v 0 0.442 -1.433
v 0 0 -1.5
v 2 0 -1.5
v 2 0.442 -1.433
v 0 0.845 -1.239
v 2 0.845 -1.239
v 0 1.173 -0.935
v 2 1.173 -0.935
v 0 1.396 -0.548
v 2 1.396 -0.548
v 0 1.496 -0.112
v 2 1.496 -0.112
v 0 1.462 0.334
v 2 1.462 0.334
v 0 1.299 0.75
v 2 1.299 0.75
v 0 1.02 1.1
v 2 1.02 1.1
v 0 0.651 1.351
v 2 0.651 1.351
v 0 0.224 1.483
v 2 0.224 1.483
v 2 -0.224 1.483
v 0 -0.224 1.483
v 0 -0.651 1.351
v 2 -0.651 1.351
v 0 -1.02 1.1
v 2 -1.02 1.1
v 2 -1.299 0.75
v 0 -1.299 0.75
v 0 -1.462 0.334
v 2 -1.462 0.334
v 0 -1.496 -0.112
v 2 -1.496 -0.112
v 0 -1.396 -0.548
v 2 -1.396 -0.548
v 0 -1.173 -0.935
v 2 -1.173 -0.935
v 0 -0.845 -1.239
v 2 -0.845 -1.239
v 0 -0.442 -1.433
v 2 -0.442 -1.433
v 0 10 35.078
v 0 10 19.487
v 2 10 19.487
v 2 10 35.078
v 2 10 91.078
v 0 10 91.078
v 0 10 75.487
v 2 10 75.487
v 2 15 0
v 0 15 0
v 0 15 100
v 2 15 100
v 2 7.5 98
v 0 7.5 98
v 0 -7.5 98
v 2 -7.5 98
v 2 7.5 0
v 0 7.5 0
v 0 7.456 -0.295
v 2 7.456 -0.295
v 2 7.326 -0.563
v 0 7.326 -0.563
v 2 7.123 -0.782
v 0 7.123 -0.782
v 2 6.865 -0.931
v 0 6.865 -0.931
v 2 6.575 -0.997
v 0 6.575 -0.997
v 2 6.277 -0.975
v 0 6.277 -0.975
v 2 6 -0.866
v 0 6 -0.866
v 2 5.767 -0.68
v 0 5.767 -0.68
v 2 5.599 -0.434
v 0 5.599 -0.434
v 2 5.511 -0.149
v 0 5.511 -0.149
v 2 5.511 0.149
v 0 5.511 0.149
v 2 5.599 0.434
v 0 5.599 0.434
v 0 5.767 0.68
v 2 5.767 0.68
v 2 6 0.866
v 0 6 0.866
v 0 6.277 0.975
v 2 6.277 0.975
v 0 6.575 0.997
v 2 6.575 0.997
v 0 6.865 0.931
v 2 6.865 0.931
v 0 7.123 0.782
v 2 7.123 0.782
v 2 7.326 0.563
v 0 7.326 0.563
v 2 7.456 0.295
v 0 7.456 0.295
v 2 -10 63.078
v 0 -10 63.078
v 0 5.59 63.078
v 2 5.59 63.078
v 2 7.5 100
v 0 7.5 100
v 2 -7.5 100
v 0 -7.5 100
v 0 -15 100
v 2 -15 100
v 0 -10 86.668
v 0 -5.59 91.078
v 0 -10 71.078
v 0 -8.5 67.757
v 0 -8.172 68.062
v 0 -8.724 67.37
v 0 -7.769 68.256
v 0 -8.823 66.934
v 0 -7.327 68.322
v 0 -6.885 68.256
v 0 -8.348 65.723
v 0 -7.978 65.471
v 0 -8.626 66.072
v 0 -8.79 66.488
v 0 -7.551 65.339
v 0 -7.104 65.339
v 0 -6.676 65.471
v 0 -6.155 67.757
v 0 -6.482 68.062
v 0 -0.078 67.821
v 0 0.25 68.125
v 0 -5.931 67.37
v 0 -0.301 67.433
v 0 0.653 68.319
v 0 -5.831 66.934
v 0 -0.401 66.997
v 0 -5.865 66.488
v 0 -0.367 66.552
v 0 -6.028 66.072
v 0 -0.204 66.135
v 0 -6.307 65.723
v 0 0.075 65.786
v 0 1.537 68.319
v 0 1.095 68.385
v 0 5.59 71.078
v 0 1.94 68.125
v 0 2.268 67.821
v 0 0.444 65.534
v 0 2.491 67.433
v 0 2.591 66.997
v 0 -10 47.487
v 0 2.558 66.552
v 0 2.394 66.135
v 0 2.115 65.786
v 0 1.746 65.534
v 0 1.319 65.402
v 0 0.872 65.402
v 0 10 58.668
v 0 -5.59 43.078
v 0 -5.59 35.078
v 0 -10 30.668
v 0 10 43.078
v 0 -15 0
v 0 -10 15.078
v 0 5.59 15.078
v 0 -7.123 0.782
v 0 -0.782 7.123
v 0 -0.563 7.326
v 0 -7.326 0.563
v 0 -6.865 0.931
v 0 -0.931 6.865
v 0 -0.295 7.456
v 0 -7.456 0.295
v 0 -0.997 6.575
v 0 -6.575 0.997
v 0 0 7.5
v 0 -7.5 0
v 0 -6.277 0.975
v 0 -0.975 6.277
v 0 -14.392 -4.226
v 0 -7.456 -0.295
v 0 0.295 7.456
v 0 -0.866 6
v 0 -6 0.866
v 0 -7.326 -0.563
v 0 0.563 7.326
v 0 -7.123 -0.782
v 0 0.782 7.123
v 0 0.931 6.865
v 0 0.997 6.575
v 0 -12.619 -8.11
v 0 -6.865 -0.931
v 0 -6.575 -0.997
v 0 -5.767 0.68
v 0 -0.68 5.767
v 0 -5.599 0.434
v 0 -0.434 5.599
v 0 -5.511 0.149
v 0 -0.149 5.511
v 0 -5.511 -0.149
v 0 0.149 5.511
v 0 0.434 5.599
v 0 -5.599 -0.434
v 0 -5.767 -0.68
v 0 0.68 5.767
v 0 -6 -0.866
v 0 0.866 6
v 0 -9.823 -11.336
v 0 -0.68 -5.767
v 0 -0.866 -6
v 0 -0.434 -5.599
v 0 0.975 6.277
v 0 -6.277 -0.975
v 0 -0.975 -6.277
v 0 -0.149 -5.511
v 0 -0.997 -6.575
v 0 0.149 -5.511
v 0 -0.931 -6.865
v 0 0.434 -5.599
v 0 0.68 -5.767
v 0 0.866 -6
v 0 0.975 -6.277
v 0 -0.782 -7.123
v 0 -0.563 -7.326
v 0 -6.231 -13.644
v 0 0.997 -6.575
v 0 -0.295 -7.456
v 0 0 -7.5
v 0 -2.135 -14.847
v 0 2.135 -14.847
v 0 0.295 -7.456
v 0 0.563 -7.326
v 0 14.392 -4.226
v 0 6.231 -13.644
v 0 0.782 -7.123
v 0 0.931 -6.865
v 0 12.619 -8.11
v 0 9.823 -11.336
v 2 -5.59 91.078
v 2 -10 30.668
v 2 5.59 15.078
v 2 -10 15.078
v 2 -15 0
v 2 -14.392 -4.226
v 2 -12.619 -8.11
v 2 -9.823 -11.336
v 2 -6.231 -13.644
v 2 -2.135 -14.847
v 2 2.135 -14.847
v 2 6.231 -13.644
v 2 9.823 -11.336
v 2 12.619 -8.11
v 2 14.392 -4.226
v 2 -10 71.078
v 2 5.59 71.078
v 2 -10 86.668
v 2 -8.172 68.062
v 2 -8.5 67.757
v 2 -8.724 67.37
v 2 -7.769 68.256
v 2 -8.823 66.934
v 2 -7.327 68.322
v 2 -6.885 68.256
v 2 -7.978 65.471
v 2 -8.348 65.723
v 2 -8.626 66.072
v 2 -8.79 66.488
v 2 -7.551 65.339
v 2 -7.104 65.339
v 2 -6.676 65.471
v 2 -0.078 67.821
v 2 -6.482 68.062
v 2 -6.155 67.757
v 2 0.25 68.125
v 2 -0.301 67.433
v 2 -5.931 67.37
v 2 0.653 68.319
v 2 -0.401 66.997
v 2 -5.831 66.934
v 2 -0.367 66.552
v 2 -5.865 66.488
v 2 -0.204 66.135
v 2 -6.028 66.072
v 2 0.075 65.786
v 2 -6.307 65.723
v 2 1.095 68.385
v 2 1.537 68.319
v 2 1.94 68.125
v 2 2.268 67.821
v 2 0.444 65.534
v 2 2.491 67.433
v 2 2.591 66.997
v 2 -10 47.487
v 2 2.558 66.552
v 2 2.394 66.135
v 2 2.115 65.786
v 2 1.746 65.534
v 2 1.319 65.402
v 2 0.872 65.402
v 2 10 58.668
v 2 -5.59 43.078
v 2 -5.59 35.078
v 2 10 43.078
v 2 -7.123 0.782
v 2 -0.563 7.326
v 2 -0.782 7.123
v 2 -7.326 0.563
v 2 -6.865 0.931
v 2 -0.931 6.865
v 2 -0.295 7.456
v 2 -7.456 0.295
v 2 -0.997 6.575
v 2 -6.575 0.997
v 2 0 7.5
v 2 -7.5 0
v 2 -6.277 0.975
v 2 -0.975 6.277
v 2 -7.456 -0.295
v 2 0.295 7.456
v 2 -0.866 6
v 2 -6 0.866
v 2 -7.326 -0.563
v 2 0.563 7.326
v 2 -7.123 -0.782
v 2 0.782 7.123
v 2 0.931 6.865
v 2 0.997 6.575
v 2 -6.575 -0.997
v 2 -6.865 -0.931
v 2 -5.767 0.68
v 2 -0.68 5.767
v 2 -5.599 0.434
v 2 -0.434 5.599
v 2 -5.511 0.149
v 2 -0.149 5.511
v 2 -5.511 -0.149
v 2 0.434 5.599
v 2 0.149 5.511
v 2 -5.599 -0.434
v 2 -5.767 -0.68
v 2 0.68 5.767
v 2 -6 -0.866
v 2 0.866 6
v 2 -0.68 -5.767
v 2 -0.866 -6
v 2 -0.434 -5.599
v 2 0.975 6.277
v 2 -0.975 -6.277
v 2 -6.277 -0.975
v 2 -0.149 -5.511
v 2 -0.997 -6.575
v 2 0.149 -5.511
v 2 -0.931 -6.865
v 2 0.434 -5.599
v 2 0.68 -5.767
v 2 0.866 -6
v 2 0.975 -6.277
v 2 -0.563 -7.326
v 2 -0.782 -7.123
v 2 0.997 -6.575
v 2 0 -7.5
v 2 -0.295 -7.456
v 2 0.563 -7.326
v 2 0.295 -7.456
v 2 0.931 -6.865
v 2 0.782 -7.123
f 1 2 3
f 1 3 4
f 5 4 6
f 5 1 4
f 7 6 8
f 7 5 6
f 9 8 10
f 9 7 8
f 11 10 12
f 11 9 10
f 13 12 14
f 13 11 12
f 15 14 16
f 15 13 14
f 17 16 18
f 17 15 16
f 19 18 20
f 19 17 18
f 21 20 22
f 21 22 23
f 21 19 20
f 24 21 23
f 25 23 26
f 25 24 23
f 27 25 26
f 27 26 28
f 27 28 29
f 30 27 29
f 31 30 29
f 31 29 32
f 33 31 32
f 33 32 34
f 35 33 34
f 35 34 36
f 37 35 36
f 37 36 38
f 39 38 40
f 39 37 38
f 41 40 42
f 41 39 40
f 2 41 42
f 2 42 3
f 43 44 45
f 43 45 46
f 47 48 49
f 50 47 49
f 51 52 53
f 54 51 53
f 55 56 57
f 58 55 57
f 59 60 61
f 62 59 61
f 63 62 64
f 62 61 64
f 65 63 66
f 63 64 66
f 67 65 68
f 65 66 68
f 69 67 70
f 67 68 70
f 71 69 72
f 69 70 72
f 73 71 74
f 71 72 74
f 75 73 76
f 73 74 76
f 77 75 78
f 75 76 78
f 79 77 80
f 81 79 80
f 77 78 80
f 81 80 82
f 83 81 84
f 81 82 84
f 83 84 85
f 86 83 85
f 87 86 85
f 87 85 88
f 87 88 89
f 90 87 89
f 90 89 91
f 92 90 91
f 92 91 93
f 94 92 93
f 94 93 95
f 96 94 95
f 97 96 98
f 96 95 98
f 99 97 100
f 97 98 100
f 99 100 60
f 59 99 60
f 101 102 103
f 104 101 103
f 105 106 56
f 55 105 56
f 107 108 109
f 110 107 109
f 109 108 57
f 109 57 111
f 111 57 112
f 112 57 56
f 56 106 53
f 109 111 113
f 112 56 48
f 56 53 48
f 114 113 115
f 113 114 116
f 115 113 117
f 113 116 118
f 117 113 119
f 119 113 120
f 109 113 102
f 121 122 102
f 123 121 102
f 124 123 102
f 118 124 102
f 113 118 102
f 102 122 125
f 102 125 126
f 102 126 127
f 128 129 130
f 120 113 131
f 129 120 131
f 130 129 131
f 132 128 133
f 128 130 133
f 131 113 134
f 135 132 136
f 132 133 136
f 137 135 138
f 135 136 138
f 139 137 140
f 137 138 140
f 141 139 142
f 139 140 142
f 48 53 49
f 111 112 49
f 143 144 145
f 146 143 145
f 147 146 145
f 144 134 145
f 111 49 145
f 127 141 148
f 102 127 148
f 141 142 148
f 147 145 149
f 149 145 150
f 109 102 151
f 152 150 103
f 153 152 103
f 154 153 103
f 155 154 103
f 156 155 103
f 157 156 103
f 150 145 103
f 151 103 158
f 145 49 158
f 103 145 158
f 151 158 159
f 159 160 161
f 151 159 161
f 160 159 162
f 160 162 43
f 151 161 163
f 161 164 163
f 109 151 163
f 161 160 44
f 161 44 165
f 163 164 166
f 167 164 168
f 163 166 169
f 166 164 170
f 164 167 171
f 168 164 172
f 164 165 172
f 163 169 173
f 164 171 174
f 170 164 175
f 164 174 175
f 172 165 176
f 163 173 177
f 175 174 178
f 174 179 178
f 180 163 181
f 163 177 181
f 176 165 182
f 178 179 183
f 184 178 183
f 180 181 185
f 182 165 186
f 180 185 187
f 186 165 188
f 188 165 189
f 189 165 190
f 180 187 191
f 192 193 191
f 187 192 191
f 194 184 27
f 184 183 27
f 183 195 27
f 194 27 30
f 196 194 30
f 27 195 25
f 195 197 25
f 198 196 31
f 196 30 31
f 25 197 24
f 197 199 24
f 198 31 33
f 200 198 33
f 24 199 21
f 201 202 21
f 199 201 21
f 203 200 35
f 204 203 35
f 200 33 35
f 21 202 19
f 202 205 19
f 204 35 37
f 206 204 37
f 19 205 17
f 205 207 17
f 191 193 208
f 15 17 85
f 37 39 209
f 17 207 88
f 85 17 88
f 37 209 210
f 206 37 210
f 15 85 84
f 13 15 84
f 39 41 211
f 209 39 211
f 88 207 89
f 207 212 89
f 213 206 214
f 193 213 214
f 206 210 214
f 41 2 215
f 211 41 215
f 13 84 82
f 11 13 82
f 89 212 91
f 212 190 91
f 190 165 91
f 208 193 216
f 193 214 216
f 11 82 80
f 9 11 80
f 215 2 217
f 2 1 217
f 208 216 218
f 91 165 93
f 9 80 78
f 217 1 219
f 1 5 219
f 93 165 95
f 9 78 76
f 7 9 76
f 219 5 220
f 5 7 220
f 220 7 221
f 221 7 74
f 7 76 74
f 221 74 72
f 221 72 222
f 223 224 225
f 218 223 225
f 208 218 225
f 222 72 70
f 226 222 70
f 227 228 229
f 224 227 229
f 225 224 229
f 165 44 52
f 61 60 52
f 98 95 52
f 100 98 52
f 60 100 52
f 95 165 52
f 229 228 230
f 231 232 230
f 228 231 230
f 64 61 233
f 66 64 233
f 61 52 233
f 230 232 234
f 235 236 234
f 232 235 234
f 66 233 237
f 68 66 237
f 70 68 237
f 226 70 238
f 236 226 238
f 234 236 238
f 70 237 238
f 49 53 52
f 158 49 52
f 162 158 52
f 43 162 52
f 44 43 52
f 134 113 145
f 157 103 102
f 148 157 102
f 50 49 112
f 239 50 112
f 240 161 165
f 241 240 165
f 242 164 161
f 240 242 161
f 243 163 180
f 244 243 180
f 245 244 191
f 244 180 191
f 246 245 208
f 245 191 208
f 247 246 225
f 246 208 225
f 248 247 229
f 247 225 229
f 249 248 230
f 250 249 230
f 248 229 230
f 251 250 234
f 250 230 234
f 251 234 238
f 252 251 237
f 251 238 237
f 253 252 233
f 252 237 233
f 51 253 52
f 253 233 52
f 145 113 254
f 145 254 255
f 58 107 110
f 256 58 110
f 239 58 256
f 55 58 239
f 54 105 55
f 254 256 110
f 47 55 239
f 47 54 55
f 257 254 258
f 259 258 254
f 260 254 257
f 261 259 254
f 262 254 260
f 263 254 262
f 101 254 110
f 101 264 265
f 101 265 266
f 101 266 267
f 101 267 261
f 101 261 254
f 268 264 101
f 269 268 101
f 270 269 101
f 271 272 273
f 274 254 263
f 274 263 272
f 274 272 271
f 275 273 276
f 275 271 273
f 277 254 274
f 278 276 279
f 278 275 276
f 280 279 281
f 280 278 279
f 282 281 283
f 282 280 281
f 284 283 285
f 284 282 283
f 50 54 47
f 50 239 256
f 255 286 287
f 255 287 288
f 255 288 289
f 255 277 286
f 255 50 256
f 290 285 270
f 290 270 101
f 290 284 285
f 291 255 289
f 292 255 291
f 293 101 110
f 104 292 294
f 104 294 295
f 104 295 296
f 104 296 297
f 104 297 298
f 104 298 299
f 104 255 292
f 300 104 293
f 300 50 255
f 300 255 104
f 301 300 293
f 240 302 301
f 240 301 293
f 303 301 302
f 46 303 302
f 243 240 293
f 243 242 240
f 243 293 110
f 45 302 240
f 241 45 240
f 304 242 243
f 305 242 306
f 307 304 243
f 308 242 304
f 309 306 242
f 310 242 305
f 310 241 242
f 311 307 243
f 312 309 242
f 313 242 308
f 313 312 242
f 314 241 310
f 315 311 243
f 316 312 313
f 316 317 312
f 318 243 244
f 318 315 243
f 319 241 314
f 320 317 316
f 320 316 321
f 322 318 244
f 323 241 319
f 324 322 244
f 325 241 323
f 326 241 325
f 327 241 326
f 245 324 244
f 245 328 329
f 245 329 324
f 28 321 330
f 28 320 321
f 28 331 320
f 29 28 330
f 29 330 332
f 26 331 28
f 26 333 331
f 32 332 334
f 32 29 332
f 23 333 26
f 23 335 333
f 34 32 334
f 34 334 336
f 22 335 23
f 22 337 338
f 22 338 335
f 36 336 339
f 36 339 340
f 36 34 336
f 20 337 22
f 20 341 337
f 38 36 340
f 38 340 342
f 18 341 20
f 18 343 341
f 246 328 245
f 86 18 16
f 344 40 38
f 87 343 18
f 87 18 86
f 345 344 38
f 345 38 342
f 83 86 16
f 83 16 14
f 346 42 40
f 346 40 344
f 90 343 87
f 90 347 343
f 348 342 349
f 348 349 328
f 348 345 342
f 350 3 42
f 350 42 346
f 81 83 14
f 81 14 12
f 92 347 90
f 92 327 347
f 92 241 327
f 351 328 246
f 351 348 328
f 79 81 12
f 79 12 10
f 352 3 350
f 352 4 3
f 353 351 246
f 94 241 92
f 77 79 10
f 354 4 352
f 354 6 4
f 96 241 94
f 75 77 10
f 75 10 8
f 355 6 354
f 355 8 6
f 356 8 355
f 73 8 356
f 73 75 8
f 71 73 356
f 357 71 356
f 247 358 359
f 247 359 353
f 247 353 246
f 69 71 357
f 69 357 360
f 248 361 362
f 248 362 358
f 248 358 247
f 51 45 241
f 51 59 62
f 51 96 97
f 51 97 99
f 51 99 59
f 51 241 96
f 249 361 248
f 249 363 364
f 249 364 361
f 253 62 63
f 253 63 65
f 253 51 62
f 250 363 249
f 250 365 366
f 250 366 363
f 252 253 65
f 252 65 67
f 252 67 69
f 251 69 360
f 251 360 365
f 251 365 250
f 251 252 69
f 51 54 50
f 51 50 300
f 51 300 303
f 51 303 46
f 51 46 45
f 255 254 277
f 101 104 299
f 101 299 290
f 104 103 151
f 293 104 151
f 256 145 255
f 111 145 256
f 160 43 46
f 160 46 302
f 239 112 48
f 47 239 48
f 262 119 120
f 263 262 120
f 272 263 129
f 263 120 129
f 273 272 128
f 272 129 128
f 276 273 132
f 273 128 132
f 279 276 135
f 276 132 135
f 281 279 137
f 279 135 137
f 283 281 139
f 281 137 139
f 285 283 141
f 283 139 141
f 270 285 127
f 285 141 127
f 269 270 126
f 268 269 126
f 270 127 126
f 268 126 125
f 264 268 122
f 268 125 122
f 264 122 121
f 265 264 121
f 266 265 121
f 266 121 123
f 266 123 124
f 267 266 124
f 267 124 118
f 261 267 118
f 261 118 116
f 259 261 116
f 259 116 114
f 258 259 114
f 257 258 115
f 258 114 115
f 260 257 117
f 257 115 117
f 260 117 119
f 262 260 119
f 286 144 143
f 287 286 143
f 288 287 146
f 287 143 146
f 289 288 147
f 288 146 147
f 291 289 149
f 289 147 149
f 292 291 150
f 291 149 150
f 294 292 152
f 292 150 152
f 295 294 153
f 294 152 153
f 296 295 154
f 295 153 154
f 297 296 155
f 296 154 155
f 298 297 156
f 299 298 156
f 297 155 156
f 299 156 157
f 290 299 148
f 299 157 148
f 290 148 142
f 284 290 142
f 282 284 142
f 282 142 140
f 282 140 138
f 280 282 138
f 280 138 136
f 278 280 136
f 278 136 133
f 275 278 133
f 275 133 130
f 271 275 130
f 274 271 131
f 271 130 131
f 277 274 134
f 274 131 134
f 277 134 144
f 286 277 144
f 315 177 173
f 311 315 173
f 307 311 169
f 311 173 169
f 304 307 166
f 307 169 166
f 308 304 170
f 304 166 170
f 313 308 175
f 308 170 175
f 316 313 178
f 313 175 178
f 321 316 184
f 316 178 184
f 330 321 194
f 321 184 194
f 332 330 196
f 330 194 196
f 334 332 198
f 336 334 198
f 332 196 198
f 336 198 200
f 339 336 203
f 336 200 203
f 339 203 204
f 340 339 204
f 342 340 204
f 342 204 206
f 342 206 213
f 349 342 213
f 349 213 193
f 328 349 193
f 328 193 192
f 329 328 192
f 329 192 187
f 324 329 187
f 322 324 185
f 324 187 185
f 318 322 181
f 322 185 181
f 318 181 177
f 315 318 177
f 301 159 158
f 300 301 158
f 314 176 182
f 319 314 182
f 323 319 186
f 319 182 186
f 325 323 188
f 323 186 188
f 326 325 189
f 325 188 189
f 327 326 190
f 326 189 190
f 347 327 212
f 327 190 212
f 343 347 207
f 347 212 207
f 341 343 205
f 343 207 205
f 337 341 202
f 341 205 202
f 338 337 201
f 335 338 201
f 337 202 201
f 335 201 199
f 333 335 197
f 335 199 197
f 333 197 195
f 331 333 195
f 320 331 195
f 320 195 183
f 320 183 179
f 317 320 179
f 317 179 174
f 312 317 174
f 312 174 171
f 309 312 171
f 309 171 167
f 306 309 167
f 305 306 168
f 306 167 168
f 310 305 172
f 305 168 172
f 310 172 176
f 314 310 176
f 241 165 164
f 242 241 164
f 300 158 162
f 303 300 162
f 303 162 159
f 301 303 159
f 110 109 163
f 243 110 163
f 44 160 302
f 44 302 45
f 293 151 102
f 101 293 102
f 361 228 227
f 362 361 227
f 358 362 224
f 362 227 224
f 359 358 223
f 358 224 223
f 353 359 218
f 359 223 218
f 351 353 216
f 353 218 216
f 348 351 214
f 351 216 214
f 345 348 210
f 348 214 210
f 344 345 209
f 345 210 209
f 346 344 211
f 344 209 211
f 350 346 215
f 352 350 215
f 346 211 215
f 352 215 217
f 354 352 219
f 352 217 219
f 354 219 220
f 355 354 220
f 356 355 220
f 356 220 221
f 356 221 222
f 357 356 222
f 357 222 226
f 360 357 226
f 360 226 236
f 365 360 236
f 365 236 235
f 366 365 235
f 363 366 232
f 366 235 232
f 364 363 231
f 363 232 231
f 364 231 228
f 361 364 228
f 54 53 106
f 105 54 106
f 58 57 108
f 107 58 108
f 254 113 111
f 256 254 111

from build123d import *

# Parameters (mm, degrees)
SKETCH1_R           = 1.5
BOSS_EXTRUDE1_DEPTH = 2
SKETCH2_R           = 1
SKETCH2_R_2         = 1.5
CUT_EXTRUDE1_DEPTH  = 2
CIRPATTERN1_COUNT   = 4


with BuildPart() as part:
    # Sketch1 → Boss-Extrude1 (new body)
    with BuildSketch(Plane(origin=(0, 0, 0), x_dir=(0, 0, -1), z_dir=(1, 0, 0))):
        with BuildLine():
            Line((0, 15), (-100, 15))
            Line((-100, 15), (-100, 7.5))
            Line((-100, 7.5), (-98, 7.5))
            Line((-98, 7.5), (-98, -7.5))
            Line((-98, -7.5), (-100, -7.5))
            Line((-100, -7.5), (-100, -15))
            Line((-100, -15), (-70.810782002, -15))
            Line((-70.810782002, -15), (-68.551280878, -15))
            Line((-68.551280878, -15), (0, -15))
            ThreePointArc((0, -15), (15, 0), (0, 15))
        make_face()
        Circle(SKETCH1_R, mode=Mode.SUBTRACT)
        Polygon((-91.077825525, 10), (-75.487484581, 10), (-91.077825525, -5.590340945), align=None, mode=Mode.SUBTRACT)
        Polygon((-86.66816647, -10), (-73.439167119, -10), (-71.179665994, -10), (-71.077825525, -10), (-71.077825525, 5.590340945), align=None, mode=Mode.SUBTRACT)
        Polygon((-47.487484581, -10), (-63.077825525, -10), (-63.077825525, 5.590340945), align=None, mode=Mode.SUBTRACT)
        Polygon((-43.077825525, -5.590340945), (-58.66816647, 10), (-43.077825525, 10), align=None, mode=Mode.SUBTRACT)
        Polygon((-35.077825525, 10), (-35.077825525, -5.590340945), (-19.487484581, 10), align=None, mode=Mode.SUBTRACT)
        Polygon((-15.077825525, 5.590340945), (-15.077825525, -10), (-30.66816647, -10), align=None, mode=Mode.SUBTRACT)
    extrude(amount=BOSS_EXTRUDE1_DEPTH)

    # Sketch2 → Cut-Extrude1 (cut)
    with BuildSketch(Plane.ZY):
        with Locations((6.5, 0)):
            Circle(SKETCH2_R)
        with Locations((66.885344311, 1.095113855)):
            Circle(SKETCH2_R_2)
        with Locations((66.822152611, -7.327248895)):
            Circle(SKETCH2_R_2)
    cut_extrude1 = extrude(amount=-CUT_EXTRUDE1_DEPTH, mode=Mode.SUBTRACT)

    # CirPattern1: Cut-Extrude1 ×4 about axis
    cirpattern1_axis = Axis((0, 0, 0), (1, 0, 0))
    for i in range(1, CIRPATTERN1_COUNT):
        add(cut_extrude1.rotate(cirpattern1_axis, i * 360 / CIRPATTERN1_COUNT), mode=Mode.SUBTRACT)


solid = part.part
